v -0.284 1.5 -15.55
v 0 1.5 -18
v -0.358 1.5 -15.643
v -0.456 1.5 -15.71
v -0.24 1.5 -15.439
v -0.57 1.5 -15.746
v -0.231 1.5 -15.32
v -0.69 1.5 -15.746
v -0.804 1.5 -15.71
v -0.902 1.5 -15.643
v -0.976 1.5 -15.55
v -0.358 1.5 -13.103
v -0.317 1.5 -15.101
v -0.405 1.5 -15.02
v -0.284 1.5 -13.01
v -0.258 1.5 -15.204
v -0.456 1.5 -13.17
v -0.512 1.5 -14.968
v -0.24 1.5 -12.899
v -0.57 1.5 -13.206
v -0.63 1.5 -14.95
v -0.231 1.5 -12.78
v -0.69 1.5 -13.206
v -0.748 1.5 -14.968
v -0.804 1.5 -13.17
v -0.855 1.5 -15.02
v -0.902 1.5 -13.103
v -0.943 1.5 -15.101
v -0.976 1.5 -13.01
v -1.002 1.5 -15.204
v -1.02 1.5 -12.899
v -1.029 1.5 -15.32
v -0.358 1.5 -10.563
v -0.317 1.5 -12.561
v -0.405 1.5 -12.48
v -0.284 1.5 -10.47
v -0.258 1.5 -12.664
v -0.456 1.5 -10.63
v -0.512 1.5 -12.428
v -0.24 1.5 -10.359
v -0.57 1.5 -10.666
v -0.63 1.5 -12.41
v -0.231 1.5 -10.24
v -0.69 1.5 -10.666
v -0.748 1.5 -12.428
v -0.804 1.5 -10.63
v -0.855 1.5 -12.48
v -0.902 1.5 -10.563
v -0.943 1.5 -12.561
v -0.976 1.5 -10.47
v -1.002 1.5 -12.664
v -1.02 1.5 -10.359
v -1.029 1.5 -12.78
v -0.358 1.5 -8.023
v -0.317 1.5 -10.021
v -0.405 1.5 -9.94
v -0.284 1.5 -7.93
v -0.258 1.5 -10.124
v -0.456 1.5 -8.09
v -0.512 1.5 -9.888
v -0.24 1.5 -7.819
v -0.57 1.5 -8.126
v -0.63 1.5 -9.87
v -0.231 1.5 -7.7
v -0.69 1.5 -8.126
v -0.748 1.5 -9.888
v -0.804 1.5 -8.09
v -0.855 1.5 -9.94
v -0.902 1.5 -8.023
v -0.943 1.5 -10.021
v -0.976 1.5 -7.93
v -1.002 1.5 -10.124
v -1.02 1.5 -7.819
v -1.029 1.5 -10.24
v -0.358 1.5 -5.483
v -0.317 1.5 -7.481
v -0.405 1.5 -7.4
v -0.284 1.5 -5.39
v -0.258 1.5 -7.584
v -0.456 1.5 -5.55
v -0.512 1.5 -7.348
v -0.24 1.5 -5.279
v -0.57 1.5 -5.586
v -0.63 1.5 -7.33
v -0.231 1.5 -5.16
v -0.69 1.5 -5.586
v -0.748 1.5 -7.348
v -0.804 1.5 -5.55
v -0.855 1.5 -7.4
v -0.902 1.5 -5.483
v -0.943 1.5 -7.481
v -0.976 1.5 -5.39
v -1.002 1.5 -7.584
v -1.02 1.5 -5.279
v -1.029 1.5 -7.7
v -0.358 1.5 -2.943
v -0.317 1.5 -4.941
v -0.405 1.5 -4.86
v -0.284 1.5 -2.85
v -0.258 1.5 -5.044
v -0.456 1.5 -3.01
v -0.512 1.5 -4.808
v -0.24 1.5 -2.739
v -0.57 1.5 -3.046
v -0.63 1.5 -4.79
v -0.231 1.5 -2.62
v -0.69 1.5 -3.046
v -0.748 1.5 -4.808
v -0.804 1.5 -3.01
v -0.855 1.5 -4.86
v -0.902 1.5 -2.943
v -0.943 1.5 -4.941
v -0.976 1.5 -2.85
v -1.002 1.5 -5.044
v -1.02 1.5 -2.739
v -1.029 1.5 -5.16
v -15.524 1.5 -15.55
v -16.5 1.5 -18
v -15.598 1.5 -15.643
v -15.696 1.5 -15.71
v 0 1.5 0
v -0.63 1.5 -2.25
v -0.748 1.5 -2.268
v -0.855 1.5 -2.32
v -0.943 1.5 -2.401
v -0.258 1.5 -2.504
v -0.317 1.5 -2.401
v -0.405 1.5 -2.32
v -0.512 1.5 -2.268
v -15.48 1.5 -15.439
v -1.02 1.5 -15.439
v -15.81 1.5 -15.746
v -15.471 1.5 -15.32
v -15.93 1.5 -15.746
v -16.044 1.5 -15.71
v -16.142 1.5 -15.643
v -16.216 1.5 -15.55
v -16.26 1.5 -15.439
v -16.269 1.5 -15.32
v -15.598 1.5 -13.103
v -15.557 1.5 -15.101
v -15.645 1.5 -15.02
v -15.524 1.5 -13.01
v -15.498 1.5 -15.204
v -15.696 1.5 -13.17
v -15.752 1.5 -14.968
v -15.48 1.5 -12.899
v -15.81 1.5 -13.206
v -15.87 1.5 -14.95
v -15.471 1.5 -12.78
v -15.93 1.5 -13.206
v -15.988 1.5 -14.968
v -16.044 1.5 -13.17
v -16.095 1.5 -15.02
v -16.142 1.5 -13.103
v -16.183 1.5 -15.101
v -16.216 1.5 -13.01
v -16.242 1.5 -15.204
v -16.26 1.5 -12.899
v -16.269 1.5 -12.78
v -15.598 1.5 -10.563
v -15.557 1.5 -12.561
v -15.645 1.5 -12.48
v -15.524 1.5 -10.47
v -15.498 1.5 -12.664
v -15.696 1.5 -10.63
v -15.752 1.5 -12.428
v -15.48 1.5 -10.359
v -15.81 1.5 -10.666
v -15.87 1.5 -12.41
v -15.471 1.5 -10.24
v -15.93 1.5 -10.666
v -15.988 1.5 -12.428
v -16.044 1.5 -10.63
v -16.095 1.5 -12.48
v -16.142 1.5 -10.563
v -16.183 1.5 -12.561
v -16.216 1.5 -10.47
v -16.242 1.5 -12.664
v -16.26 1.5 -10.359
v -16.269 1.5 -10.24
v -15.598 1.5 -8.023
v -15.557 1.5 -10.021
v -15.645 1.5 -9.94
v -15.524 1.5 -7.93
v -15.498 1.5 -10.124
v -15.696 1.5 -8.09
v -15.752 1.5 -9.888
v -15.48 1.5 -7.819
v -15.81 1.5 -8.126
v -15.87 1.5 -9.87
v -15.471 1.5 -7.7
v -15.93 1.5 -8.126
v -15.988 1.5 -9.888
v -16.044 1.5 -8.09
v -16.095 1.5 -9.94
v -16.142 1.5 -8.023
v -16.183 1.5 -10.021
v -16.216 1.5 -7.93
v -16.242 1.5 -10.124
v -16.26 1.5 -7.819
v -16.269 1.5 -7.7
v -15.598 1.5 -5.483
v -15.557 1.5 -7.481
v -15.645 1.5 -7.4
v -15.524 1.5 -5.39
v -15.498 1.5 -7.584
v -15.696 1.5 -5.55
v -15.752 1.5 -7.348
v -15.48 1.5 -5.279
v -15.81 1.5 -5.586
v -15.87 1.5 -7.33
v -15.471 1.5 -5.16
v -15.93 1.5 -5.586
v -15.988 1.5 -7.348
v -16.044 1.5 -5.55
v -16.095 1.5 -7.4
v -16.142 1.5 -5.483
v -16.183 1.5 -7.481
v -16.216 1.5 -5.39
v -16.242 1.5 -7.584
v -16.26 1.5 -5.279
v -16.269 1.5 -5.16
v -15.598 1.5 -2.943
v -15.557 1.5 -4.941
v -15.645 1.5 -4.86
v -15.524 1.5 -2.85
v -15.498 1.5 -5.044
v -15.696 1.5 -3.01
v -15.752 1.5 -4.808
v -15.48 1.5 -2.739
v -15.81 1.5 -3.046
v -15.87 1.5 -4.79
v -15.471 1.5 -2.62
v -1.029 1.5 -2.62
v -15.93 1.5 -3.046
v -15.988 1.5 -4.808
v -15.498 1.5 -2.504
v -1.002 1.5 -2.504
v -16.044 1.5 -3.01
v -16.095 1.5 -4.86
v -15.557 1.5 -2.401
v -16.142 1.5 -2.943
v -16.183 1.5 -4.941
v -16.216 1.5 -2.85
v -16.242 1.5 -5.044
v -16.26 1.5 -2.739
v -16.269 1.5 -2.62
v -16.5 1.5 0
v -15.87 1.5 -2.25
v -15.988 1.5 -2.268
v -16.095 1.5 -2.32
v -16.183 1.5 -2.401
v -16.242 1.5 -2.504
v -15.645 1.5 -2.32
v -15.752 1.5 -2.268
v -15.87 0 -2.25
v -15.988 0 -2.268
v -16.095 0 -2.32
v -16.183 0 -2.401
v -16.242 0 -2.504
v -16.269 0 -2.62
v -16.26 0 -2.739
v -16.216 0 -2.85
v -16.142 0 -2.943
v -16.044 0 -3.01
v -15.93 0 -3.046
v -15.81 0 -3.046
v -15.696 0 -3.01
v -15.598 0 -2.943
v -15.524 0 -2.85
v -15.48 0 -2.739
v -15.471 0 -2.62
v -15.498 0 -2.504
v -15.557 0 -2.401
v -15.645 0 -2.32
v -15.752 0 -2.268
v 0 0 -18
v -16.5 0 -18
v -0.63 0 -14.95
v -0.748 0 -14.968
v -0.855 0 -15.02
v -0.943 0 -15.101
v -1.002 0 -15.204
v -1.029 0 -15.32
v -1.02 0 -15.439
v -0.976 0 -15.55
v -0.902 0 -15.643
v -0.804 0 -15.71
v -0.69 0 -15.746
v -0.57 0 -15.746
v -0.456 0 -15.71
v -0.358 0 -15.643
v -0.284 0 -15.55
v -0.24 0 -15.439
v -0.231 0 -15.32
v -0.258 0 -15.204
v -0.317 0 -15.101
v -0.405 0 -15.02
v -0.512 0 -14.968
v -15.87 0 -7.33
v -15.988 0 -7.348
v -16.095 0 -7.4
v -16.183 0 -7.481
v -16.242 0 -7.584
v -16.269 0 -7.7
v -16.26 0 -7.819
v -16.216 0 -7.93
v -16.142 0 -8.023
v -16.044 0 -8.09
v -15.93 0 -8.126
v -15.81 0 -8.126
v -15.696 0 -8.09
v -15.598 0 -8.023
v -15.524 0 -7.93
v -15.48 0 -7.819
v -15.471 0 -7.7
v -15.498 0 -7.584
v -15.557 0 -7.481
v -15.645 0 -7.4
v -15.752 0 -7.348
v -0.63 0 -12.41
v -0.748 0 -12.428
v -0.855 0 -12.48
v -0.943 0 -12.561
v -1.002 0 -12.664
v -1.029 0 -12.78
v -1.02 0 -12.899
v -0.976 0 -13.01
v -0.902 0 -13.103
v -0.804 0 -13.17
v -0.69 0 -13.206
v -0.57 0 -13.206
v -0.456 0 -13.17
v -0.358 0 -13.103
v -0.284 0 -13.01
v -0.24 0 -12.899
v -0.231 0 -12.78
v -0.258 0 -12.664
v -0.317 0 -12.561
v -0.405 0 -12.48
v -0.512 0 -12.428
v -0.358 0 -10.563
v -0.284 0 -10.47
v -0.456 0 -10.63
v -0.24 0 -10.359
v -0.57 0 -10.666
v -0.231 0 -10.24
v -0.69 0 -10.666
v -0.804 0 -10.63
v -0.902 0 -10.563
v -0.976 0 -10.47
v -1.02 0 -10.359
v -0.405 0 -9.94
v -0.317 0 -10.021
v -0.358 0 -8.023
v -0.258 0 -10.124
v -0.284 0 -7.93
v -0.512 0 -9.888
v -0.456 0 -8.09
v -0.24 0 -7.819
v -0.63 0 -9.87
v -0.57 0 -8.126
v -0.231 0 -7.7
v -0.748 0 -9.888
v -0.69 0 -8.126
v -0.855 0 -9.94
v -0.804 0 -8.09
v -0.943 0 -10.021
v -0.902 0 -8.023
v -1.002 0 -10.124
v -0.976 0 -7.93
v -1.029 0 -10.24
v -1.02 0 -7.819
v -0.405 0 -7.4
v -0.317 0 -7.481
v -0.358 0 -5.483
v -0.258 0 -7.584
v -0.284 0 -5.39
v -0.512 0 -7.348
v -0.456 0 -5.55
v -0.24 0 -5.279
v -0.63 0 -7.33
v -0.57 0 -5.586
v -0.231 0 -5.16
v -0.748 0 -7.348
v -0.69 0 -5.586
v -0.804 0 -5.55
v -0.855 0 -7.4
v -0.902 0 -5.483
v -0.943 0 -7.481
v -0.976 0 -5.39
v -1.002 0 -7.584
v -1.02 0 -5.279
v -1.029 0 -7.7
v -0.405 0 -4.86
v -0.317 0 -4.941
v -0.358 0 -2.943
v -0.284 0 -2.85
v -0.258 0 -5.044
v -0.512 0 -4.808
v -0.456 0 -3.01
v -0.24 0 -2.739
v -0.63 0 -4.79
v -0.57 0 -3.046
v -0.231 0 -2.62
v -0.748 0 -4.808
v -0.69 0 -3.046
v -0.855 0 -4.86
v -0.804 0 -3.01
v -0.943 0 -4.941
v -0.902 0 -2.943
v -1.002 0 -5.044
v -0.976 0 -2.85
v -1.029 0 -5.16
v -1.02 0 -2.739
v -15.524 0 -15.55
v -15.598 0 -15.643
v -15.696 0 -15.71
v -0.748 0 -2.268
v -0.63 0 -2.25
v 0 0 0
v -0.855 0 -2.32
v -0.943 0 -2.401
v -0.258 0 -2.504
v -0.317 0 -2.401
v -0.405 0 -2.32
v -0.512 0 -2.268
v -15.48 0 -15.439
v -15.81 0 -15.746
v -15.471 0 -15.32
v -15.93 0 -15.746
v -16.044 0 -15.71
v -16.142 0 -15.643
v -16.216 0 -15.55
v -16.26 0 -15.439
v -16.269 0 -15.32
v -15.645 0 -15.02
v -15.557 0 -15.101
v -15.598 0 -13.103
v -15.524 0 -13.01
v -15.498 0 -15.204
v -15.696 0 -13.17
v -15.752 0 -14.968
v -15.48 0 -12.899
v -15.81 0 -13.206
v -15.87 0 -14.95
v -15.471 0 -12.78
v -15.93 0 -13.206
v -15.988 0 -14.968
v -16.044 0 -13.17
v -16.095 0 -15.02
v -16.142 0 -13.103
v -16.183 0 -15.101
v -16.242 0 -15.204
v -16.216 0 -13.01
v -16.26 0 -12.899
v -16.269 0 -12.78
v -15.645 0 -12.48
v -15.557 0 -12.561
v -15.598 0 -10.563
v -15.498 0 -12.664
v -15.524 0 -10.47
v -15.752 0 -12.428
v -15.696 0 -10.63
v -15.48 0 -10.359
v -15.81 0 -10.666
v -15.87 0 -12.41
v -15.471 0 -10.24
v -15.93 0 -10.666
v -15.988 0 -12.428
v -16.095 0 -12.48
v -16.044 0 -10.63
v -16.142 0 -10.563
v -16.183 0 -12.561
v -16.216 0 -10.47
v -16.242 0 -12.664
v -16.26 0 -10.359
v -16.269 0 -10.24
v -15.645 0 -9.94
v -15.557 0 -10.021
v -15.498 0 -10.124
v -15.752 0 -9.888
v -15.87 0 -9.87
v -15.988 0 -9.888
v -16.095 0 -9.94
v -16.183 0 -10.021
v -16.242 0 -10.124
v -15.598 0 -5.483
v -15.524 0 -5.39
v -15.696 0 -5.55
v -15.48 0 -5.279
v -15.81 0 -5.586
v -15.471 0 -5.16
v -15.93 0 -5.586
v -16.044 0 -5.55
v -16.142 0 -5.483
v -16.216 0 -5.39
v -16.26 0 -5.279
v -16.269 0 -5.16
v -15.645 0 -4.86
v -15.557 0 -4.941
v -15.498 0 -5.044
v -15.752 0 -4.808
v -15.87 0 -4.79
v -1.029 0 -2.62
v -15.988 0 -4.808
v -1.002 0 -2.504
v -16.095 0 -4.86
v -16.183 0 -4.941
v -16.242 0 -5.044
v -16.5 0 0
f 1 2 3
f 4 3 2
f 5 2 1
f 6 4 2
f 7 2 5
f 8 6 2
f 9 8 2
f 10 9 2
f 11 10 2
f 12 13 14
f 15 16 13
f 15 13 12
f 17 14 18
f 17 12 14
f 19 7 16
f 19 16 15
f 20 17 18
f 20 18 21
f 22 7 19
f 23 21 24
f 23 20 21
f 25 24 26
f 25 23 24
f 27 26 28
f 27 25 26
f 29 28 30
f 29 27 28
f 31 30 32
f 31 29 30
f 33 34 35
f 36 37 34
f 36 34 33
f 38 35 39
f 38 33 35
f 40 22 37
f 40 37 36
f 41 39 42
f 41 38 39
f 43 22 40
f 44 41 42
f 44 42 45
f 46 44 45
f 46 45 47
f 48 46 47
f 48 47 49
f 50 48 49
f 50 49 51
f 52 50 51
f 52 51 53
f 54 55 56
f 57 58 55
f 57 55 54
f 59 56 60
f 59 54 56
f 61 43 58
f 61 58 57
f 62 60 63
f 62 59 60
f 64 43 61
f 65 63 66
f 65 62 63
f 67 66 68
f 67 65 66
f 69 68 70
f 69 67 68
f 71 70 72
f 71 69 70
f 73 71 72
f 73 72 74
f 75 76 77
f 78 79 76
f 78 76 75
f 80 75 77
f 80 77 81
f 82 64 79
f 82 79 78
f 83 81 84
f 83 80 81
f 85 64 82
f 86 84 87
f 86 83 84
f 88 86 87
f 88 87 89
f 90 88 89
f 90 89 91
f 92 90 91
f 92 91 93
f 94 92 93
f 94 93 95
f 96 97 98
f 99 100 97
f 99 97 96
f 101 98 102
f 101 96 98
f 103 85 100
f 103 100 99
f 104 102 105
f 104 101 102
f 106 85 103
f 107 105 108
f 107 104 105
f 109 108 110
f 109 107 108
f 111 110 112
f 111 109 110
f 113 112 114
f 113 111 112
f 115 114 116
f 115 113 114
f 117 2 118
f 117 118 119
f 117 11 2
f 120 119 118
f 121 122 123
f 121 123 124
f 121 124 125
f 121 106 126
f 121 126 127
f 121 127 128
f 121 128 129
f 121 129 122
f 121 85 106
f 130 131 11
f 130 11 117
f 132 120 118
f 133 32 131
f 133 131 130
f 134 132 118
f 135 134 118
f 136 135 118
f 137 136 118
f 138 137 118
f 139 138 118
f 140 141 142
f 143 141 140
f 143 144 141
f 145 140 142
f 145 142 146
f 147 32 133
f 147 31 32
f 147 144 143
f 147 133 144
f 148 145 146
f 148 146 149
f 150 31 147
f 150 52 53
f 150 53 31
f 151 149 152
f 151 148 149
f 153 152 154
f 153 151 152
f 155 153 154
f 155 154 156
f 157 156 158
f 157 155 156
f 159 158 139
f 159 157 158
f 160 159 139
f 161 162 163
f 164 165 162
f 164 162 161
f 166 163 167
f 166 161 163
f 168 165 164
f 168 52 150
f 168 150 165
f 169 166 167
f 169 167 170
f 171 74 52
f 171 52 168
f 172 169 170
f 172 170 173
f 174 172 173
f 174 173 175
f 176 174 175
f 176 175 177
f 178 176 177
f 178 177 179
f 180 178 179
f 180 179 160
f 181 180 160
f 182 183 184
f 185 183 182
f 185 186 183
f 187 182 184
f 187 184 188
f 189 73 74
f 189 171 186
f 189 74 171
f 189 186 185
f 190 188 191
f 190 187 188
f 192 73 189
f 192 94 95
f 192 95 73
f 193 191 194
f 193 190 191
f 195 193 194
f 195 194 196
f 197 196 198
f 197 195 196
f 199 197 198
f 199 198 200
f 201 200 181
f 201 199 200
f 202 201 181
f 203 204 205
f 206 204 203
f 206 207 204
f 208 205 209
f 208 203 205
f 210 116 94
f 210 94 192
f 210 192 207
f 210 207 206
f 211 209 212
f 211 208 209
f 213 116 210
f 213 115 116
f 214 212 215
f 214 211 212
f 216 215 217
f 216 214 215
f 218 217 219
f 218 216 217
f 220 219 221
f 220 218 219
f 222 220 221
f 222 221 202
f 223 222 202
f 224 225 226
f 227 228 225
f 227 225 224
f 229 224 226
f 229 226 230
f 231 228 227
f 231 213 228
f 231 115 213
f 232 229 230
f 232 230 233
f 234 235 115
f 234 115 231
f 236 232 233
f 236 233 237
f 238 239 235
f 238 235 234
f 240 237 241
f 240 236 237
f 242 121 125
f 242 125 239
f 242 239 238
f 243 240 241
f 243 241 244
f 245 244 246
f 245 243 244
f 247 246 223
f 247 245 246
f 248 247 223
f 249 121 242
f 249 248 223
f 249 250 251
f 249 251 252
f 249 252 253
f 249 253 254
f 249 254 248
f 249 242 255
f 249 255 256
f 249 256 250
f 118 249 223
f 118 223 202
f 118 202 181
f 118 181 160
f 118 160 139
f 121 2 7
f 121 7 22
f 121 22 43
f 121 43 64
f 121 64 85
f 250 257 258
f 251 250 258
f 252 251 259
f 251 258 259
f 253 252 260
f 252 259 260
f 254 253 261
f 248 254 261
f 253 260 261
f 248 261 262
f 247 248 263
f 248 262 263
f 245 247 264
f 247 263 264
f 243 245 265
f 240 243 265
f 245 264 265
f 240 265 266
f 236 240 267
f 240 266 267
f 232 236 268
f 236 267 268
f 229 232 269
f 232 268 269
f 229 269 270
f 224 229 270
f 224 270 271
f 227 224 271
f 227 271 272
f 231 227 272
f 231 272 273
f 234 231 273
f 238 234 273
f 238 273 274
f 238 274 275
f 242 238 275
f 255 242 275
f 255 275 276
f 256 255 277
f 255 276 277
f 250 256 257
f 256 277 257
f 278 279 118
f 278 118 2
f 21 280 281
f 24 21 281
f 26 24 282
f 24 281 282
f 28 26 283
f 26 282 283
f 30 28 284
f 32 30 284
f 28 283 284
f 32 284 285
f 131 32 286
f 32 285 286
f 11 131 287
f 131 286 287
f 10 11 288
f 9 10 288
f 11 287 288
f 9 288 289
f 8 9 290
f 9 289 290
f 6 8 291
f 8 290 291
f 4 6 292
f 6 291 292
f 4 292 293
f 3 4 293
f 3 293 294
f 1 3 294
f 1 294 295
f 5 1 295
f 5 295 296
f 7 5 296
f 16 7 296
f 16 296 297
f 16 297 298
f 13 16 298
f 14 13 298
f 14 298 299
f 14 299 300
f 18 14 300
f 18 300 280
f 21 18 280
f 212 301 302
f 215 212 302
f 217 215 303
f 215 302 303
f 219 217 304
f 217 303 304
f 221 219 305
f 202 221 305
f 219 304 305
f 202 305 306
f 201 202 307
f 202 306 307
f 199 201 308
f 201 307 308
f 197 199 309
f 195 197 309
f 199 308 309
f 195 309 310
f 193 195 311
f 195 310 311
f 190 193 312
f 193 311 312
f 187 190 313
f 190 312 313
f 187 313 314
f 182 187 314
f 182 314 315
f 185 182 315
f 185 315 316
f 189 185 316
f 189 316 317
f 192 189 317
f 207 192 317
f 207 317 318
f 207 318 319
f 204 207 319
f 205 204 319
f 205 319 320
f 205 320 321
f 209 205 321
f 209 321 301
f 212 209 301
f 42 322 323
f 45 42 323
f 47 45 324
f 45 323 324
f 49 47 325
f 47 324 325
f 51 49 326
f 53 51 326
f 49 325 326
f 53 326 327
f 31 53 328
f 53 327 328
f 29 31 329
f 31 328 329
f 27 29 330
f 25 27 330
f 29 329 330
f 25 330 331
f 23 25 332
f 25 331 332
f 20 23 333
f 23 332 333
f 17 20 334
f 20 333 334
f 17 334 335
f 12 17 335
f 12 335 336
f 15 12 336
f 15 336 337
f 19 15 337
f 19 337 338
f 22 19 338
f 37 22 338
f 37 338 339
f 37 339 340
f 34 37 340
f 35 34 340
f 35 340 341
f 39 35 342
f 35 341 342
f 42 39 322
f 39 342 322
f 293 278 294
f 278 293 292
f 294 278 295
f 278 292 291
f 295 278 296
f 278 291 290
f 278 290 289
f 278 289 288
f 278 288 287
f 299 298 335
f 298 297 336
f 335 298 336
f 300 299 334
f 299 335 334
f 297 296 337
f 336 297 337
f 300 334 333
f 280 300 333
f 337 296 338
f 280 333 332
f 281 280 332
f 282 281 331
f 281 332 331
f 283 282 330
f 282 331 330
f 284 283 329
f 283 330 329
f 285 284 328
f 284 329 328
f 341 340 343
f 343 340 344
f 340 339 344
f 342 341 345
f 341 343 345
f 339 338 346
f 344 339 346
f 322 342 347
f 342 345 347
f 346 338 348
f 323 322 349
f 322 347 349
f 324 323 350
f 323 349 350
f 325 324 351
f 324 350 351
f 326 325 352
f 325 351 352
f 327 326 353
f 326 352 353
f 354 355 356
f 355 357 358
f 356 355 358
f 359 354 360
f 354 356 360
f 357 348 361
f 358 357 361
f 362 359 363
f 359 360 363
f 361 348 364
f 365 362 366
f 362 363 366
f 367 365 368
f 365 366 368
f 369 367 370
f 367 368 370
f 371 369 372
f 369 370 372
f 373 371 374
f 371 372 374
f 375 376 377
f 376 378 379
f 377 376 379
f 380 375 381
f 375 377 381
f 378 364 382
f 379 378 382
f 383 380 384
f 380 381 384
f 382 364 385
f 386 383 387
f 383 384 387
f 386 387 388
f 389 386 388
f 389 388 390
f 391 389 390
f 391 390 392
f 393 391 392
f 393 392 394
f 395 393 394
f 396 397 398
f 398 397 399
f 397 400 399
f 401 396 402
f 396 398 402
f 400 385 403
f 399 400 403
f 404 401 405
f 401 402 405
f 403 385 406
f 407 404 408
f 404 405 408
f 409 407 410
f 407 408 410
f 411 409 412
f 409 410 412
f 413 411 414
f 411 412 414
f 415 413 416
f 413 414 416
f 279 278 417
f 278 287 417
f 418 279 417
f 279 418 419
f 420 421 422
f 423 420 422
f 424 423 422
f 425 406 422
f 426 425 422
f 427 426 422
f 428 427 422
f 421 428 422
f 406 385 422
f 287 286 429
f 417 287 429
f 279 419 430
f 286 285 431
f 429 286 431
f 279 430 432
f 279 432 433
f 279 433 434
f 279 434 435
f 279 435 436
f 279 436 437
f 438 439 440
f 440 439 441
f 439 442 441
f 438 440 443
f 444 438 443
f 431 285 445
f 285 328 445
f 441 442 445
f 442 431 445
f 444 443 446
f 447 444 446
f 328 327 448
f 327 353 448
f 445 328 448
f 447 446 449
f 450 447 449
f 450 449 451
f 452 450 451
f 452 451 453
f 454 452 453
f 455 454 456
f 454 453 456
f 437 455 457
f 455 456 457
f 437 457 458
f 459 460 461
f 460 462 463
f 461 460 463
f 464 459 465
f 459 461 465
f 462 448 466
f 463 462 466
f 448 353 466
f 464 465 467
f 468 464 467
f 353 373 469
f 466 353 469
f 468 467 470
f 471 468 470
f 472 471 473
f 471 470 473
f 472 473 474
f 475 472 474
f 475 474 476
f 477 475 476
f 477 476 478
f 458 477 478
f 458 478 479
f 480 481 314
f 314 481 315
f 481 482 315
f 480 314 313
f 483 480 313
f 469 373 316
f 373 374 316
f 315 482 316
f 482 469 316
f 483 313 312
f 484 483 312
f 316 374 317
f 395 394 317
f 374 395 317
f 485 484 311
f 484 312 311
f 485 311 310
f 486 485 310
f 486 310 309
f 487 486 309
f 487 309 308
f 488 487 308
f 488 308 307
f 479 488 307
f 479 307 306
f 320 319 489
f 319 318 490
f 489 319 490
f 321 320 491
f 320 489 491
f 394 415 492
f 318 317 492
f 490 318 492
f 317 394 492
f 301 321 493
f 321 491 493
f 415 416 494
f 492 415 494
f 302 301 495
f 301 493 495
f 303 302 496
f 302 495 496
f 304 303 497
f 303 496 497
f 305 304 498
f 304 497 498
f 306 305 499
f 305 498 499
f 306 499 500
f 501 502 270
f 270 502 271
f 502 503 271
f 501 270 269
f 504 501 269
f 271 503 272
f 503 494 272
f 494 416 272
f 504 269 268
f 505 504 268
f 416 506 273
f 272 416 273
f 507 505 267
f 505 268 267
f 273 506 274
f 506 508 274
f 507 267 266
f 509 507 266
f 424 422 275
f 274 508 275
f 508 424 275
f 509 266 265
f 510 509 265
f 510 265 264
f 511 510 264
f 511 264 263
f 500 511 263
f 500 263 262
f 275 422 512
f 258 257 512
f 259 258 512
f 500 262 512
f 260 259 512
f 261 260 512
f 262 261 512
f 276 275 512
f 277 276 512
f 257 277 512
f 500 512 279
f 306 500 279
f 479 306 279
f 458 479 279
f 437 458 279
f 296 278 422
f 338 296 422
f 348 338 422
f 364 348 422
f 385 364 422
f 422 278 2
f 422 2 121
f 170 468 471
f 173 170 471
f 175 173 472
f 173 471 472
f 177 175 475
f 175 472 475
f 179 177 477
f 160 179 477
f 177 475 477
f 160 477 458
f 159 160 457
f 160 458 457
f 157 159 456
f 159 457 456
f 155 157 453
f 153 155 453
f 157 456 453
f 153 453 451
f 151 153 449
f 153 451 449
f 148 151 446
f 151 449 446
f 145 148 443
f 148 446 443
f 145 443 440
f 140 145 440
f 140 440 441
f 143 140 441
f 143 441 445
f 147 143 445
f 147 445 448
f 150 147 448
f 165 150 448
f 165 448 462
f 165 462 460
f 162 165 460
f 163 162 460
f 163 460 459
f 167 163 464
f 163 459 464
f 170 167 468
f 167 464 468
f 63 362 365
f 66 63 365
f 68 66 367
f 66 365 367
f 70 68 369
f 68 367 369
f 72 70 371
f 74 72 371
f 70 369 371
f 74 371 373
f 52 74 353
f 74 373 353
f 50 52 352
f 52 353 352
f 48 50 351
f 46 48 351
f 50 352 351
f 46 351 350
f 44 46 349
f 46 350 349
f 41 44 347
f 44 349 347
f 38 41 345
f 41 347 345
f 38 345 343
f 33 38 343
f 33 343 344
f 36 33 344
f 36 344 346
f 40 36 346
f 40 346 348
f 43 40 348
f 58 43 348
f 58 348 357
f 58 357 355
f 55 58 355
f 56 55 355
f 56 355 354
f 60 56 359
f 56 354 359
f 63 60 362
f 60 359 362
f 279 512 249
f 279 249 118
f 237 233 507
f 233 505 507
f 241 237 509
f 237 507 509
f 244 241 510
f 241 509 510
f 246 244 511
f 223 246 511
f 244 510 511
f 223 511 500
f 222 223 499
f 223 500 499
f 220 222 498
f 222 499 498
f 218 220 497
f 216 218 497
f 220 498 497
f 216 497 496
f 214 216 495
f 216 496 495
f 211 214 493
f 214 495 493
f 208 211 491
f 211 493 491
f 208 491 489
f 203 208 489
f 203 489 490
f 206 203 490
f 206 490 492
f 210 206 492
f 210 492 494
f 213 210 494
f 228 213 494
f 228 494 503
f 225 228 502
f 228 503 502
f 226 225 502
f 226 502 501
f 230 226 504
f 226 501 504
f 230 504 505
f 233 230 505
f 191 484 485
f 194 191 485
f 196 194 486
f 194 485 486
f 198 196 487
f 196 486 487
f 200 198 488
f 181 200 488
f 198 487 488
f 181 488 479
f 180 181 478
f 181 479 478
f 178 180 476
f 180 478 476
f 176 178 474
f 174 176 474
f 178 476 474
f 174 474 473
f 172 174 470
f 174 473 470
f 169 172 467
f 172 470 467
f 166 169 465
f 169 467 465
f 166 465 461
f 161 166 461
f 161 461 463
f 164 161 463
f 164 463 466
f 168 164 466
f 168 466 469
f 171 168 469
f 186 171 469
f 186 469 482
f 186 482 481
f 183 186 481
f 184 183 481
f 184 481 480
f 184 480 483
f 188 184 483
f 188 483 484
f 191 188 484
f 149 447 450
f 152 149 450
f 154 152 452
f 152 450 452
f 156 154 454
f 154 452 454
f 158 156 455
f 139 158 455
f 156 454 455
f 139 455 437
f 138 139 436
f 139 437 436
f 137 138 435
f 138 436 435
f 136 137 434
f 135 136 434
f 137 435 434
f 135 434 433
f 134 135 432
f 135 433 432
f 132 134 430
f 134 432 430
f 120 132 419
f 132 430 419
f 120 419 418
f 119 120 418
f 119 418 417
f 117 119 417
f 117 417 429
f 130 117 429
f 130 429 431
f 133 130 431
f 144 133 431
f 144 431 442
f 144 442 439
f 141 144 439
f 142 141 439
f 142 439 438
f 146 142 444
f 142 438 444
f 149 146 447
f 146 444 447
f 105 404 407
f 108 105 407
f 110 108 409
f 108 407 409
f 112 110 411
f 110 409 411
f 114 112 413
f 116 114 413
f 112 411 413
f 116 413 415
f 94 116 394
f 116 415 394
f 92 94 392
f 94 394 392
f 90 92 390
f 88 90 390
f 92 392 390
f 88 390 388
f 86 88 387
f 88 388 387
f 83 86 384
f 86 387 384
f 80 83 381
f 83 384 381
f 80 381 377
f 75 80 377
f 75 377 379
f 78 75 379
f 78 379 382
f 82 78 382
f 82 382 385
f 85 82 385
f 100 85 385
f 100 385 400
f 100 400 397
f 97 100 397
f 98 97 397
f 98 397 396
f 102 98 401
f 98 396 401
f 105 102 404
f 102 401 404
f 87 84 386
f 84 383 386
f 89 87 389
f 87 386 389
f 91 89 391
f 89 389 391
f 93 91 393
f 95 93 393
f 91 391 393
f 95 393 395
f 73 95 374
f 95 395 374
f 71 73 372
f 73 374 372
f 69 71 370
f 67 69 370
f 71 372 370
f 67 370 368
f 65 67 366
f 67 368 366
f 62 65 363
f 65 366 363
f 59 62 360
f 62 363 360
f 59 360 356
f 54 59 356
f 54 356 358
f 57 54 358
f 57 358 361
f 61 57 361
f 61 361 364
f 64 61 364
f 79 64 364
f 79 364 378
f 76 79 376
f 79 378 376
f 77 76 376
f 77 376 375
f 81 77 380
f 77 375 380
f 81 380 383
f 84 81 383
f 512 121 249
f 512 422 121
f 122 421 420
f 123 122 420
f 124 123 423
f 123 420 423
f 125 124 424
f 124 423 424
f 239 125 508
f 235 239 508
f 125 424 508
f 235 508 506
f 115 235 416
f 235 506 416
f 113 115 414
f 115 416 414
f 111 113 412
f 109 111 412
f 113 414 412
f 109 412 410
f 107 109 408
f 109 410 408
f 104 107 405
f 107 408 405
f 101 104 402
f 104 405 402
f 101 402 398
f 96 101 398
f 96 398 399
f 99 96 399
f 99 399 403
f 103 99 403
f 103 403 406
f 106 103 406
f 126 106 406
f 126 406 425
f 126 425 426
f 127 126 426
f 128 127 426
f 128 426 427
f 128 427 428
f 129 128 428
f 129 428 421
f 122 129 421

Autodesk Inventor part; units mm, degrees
ref_plane "YZ Plane" through (0, 0, 0) normal (1, 0, 0) x (0, 1, 0)
ref_plane "XZ Plane" through (0, 0, 0) normal (0, 1, 0) x (-1, 0, 0)
ref_plane "XY Plane" through (0, 0, 0) normal (0, 0, 1) x (1, 0, 0)
sketch "Эскиз1" plane through (0, 0, 0) normal (0, 1, 0) x (-1, 0, 0)
  line L0 (0, 0) -> (16.5, 0)
  line L1 (16.5, 0) -> (16.5, -18)
  line L2 (16.5, -18) -> (0, -18)
  line L3 (0, -18) -> (0, 0)
  dimension "d0" = 16.5
  dimension "d1" = 18
extrude "Выдавливание1" add sketch "Эскиз1" along normal blind 1.5
sketch "Эскиз2" plane through (0, 1.5, 0) normal (0, 1, 0) x (1, 0, 0)
  line L0 (-16.5, 18) -> (-16.5, 0) projected
  line L1 (-16.5, 0) -> (0, 0) construction
  line L2 (-8.25, 0) -> (-8.25, 18) construction
  line L3 (0, 18) -> (-16.5, 18) construction
  line L4 (-15.87, 2.65) -> (-15.87, 0) construction
  line L5 (-15.87, 15.35) -> (-15.87, 18) construction
  line L6 (-15.87, 2.65) -> (-16.5, 2.65) construction
  point P0 (-15.87, 12.81)
  point P1 (-15.87, 10.27)
  point P2 (-15.87, 7.73)
  point P3 (-15.87, 5.19)
  point P4 (-0.63, 15.35)
  point P5 (-0.63, 12.81)
  point P6 (-0.63, 10.27)
  point P7 (-0.63, 7.73)
  point P8 (-0.63, 5.19)
  point P9 (-0.63, 2.65)
  dimension "d6" = 2.54
  dimension "d11" = 15.24
hole "Отверстие1" at (-15.87, 1.5, -15.35) at (-15.87, 1.5, -12.81) at (-15.87, 1.5, -10.27) at (-15.87, 1.5, -7.73) at (-15.87, 1.5, -5.19) at (-15.87, 1.5, -2.65) at (-0.63, 1.5, -2.65) at (-0.63, 1.5, -5.19) at (-0.63, 1.5, -7.73) at (-0.63, 1.5, -10.27) at (-0.63, 1.5, -12.81) at (-0.63, 1.5, -15.35) direction (0, -1, 0) diameter 0.8 end through all
properties part number "Драйвер моторов DRV8833"
